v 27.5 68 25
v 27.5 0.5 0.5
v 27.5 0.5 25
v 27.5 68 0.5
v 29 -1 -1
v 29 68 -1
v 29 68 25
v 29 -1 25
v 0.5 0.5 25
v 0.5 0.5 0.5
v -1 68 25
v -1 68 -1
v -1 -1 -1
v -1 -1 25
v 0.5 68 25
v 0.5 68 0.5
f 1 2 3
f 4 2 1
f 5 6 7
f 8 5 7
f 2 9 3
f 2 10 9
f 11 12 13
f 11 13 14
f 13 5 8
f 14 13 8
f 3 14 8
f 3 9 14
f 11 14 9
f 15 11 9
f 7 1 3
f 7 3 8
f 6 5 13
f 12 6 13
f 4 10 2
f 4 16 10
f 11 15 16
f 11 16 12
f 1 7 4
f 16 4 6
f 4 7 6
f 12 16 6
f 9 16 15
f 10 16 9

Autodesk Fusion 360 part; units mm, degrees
sketch "Sketch1" plane through (0, 0, 0) normal (0, 0, 1) x (1, 0, 0)
  line L0 (0, 0) -> (28, 0)
  line L1 (28, 0) -> (28, 68)
  line L2 (28, 68) -> (0, 68)
  line L3 (0, 68) -> (0, 0)
  dimension "d1" = 28
  dimension "d2" = 68
extrude "Extrude1" add sketch "Sketch1" along normal blind 25
shell "Shell1" thickness 0.5 removed faces 2 at (18.6667, 68, 8.3333) at (9.3333, 45.3333, 25)
extrude "Extrude2" add 1 faces at (9.3333, 45.3333, 0) along direction (0, 0, -1) blind 1
extrude "Extrude3" add 1 faces at (28, 45.3333, 16.3333) along direction (1, 0, 0) blind 1
extrude "Extrude4" add 1 faces at (0, 45.3333, 7.6667) along direction (-1, 0, 0) blind 1
extrude "Extrude5" add 1 faces at (9, 0, 16.3333) along direction (0, -1, 0) blind 1
